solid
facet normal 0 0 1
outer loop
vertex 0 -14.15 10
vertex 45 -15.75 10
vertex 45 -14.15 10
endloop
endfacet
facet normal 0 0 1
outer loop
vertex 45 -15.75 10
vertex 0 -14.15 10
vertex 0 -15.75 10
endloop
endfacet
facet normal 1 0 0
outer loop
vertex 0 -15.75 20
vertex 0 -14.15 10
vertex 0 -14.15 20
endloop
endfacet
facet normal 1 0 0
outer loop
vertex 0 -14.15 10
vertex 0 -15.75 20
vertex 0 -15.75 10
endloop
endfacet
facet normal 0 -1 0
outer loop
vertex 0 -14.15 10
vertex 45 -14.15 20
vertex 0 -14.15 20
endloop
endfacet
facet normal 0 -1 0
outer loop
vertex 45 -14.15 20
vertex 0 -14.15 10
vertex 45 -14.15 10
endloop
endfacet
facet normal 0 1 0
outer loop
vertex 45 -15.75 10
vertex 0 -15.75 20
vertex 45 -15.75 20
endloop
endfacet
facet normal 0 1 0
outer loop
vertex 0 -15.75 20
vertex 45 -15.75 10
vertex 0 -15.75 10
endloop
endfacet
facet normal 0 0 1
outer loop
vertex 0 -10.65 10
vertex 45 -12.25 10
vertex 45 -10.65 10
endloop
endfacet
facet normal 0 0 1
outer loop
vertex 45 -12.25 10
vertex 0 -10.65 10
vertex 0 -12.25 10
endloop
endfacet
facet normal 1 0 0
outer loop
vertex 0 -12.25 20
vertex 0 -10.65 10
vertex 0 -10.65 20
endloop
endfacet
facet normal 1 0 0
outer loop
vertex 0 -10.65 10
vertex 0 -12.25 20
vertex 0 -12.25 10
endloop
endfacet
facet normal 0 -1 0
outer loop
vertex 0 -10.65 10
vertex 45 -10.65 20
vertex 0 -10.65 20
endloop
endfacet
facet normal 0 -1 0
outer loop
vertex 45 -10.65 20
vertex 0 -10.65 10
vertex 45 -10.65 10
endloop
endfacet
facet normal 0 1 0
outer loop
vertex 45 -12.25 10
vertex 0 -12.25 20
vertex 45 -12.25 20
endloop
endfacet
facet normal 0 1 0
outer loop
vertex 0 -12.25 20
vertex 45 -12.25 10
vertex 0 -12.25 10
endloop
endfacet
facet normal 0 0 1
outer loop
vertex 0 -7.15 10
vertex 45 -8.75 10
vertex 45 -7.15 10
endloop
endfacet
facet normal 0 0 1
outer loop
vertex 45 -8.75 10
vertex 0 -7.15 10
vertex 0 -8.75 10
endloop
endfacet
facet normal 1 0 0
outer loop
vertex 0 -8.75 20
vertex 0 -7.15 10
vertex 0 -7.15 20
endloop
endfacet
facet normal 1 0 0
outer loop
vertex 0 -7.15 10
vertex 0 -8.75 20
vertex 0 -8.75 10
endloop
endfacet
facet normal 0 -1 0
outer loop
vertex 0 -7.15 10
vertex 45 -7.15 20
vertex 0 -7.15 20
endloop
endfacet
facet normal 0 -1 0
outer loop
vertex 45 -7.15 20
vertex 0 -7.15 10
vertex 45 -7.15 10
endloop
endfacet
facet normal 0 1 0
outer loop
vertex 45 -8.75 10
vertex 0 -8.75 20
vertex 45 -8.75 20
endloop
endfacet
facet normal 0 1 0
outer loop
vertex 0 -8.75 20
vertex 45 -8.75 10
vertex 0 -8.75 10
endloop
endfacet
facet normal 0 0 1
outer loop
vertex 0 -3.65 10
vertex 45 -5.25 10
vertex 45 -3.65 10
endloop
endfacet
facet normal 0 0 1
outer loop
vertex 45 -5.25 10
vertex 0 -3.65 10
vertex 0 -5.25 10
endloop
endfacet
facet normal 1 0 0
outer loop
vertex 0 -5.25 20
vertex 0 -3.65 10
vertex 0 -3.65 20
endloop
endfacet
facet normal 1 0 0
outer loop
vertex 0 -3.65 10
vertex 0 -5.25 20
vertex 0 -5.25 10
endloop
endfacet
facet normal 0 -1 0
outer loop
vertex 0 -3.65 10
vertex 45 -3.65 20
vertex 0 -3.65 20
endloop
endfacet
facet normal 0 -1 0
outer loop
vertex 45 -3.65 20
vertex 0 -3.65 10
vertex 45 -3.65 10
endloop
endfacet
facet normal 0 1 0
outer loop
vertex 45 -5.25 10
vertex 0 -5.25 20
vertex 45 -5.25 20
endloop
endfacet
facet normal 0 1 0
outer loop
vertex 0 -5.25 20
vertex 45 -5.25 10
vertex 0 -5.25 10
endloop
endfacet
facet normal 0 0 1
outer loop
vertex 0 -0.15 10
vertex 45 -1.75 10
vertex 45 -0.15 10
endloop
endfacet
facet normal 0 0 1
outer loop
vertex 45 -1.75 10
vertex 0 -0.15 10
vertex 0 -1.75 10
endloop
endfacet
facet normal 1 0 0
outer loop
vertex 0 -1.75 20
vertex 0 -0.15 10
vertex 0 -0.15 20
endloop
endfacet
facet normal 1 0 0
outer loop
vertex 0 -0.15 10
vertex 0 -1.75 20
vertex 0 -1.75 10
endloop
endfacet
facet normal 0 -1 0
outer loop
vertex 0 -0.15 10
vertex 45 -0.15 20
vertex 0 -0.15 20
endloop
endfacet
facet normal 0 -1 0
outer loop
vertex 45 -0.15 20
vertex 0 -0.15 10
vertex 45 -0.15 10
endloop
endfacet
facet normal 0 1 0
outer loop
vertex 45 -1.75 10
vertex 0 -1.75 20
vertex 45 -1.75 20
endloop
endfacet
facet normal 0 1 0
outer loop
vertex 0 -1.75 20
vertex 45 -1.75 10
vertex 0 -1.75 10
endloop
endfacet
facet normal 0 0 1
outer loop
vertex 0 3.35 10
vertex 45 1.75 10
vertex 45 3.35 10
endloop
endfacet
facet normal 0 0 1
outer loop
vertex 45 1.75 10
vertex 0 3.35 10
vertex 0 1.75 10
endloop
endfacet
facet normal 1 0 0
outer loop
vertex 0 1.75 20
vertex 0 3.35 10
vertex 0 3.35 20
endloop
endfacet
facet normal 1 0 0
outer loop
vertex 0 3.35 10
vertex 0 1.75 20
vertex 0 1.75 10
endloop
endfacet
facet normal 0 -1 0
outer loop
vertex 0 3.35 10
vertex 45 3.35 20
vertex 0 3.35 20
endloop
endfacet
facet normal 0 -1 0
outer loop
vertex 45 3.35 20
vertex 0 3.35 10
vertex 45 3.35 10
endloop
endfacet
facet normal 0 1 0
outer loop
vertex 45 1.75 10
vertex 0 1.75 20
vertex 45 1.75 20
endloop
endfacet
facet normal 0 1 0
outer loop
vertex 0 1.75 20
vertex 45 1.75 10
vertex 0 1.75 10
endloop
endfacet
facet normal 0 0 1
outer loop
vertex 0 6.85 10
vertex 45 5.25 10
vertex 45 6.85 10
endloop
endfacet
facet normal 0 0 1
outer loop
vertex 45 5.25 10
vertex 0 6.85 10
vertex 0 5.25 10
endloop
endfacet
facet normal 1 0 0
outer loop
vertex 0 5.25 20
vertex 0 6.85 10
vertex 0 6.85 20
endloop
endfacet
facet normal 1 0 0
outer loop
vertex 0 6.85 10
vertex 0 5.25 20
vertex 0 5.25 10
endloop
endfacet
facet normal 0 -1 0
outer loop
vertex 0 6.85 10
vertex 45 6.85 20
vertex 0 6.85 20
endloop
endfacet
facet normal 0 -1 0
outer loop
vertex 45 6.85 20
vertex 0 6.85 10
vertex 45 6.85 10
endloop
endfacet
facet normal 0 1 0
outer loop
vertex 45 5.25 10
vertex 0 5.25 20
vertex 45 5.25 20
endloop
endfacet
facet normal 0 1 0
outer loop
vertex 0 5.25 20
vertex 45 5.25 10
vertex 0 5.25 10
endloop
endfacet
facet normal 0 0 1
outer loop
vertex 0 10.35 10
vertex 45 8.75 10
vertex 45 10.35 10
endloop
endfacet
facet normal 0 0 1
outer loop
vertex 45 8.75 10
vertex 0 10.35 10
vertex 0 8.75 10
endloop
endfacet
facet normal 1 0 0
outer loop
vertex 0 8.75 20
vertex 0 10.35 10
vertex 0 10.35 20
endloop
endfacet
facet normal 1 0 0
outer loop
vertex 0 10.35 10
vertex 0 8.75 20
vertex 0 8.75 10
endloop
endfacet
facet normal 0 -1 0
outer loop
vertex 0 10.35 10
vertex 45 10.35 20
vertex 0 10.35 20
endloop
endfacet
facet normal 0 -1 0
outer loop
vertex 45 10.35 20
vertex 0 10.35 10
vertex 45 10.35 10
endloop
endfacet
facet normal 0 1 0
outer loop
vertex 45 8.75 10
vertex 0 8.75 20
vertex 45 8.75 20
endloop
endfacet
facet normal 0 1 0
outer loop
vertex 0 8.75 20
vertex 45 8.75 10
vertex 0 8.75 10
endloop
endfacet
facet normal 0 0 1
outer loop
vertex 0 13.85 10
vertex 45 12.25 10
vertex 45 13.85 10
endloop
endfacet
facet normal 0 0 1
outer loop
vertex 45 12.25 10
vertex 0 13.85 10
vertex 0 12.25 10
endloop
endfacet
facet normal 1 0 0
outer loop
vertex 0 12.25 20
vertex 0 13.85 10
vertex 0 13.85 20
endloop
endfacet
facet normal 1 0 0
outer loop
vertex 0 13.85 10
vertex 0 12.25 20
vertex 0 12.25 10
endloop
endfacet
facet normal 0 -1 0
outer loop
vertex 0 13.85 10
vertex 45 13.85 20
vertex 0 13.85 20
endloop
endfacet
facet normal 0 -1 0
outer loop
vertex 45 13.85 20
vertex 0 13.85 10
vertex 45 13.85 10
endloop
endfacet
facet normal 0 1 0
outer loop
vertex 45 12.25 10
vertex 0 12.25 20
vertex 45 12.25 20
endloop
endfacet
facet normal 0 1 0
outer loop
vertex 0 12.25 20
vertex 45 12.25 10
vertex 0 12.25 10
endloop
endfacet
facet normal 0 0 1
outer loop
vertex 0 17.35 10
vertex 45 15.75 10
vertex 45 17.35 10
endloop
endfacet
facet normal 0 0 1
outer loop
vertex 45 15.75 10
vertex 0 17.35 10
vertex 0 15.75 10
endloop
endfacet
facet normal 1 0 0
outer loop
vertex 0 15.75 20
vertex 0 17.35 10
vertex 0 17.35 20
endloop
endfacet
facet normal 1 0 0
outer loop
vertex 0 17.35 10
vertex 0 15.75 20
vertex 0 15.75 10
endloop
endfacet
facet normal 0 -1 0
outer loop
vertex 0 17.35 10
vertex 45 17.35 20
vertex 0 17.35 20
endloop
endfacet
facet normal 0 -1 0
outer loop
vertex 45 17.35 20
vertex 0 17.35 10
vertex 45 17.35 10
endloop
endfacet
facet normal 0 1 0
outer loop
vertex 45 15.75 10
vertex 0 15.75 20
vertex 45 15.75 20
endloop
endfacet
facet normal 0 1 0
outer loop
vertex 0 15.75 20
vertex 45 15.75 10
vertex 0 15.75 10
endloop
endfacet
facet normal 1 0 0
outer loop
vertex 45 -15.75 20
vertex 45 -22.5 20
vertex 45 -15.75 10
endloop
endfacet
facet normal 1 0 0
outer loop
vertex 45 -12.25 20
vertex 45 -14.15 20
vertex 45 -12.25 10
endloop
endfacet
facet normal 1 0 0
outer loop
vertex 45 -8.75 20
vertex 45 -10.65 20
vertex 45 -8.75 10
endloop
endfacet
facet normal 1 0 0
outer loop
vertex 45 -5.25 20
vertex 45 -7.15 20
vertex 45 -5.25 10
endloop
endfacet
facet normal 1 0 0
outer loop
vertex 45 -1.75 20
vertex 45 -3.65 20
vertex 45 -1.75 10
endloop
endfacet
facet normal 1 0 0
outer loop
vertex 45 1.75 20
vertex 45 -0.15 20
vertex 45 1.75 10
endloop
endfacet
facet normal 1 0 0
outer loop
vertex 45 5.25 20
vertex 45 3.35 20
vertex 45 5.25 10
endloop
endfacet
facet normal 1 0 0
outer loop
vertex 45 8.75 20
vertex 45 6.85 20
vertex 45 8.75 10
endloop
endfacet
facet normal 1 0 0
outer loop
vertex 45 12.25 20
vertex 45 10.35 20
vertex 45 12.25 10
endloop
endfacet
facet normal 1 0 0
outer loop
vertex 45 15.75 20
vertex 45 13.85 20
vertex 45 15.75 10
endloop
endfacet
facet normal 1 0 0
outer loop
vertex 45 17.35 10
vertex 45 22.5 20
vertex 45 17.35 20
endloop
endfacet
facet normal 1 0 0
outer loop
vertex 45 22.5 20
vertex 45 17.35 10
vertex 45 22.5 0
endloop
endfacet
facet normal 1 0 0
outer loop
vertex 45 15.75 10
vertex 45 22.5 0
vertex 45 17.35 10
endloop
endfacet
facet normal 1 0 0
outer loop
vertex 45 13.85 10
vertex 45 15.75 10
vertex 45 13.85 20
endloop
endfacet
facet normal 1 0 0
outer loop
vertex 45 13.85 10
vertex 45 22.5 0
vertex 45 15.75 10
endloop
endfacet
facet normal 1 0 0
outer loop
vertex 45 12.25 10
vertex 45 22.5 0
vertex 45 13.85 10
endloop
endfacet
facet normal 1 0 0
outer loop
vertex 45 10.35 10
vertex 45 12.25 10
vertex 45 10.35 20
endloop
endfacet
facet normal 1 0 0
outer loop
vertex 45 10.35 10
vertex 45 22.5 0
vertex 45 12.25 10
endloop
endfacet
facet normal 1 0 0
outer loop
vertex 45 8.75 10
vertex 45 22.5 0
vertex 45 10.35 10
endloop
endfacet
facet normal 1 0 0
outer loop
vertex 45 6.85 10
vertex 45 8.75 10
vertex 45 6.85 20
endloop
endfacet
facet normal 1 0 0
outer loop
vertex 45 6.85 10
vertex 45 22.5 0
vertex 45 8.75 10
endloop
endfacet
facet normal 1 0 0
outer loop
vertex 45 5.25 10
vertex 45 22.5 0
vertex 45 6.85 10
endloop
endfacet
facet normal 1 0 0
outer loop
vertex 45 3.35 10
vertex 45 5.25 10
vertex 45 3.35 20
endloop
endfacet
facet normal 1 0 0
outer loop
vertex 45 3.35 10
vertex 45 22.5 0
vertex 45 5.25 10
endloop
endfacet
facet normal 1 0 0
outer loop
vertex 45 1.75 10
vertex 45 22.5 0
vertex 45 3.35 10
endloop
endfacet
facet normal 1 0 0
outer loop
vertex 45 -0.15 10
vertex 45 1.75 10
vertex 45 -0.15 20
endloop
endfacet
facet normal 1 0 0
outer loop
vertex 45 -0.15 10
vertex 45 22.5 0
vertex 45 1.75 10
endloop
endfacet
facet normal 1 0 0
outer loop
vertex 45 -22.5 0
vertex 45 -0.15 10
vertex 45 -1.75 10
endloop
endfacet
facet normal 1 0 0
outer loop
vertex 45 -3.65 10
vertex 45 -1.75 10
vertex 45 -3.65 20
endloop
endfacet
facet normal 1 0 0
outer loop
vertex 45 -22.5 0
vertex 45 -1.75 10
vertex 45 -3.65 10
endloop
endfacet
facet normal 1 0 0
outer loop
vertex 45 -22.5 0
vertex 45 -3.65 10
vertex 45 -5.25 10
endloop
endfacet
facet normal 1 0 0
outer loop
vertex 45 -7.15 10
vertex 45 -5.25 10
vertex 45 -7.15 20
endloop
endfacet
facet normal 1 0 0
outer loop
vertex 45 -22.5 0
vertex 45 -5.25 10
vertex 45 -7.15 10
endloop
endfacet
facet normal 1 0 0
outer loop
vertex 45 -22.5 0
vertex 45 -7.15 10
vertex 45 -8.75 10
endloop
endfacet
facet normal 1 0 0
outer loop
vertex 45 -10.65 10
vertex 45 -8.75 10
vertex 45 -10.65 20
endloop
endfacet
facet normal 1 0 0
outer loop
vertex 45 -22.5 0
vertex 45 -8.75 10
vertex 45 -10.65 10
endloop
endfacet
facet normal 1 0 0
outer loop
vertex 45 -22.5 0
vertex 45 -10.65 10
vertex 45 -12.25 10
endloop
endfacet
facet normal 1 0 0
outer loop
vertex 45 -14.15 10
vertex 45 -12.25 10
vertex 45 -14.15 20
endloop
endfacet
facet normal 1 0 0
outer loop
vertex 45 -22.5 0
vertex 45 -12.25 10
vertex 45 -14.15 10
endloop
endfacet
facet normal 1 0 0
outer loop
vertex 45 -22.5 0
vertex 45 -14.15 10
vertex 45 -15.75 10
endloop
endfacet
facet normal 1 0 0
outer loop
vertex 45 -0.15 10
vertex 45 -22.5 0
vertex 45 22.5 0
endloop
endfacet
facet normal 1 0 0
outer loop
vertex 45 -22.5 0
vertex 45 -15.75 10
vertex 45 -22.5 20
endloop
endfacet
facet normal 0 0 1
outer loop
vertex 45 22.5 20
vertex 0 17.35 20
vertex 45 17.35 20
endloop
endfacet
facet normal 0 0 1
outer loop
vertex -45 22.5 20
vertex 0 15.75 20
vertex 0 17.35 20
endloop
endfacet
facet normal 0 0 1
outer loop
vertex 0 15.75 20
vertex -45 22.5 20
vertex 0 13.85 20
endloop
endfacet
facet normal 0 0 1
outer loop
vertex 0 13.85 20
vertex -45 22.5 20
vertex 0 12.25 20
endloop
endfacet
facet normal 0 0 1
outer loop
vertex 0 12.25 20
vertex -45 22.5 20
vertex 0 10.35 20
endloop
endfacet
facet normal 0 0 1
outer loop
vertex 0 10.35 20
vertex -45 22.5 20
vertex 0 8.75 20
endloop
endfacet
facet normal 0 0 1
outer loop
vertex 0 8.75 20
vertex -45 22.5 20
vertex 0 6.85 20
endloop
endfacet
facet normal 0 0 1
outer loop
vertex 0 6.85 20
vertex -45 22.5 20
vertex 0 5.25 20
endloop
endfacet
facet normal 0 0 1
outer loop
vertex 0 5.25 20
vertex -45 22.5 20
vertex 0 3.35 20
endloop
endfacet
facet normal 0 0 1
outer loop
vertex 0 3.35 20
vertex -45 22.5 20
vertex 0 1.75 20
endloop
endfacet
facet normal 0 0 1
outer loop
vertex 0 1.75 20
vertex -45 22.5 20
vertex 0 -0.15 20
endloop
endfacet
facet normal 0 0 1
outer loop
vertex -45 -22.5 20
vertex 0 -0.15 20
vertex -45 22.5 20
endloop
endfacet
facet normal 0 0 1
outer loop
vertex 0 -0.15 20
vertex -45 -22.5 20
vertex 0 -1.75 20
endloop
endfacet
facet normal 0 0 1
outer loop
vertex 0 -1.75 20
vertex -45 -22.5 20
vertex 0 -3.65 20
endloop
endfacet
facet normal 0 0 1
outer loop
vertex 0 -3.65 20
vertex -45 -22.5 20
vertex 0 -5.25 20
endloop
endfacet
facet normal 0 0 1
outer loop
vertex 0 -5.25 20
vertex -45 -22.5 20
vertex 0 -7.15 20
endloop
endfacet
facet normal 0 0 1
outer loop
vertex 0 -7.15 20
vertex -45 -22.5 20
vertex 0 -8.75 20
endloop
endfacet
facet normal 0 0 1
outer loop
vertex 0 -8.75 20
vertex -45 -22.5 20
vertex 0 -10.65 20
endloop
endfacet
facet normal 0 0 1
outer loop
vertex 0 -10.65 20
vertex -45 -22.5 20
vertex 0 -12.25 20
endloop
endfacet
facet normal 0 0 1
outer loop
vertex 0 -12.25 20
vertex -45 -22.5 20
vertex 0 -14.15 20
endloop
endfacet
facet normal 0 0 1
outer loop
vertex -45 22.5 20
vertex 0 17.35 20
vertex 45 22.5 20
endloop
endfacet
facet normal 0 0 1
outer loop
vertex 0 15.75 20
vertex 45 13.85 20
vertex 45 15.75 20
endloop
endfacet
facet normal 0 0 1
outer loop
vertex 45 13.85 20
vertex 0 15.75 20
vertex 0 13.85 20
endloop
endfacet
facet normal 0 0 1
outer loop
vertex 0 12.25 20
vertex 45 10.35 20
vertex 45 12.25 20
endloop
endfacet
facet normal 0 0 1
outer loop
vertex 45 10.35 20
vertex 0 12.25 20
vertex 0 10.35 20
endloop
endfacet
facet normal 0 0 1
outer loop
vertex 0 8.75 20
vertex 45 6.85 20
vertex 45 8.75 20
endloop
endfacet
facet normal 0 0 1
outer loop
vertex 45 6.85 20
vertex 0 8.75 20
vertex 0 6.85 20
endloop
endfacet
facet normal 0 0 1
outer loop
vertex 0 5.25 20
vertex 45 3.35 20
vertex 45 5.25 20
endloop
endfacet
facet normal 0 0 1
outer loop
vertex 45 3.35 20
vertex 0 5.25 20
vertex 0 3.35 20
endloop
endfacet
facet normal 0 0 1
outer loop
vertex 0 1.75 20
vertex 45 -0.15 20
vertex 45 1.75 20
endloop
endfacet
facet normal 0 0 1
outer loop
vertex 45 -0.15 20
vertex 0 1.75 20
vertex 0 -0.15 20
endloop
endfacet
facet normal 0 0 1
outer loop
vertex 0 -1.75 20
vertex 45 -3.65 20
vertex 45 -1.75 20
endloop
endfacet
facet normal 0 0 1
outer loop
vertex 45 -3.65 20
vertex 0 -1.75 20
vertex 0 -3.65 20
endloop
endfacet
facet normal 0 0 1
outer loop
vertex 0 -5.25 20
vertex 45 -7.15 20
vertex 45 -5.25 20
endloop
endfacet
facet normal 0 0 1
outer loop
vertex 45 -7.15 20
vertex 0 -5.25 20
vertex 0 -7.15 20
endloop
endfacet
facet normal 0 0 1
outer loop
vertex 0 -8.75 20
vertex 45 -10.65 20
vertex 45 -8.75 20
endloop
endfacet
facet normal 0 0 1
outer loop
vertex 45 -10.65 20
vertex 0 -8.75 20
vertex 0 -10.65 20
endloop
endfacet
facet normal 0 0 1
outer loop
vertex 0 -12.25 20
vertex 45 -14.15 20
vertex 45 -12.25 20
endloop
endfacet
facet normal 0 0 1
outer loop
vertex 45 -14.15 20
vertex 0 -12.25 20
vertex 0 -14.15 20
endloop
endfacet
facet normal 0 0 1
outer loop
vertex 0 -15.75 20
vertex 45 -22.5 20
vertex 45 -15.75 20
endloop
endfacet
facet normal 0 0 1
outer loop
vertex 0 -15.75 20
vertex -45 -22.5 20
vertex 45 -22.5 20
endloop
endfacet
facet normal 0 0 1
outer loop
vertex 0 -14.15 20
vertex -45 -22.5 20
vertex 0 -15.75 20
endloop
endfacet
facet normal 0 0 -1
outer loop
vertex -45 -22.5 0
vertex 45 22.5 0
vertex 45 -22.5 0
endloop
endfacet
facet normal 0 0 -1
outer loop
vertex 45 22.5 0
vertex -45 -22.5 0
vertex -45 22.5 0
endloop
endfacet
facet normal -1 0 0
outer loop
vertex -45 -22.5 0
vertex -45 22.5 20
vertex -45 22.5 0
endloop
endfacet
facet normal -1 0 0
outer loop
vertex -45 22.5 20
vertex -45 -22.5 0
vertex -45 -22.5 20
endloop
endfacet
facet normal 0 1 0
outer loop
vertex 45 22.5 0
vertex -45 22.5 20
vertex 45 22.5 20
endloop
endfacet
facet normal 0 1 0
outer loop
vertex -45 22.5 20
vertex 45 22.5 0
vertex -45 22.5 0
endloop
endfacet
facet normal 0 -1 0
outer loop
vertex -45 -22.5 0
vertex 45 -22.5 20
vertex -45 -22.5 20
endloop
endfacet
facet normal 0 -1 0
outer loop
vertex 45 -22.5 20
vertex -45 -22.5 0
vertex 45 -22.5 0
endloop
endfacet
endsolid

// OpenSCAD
// Slide drying rack - holds 10 microscope slides standing upright on their long edge
// Print orientation: base block on the bed, slots open upward (+Z)

// ---------- Block ----------
block_len   = 90;    // block length along X (mm)
block_wid   = 45;    // block width along Y (mm)
block_ht    = 20;    // block height along Z (mm)

// ---------- Slots ----------
slot_count  = 10;    // number of slide slots
slot_len    = 77;    // slot length along X (mm)
slot_wid    = 1.6;   // slot width along Y (mm)
slot_depth  = 10;    // slot depth from top face (mm)
slot_pitch  = 3.5;   // centre-to-centre spacing in Y (mm)

// ---------- Misc ----------
eps         = 0.5;   // overshoot for clean boolean cuts (mm)
$fn         = 64;    // curve resolution

// Derived
first_y = -(slot_count - 1) * slot_pitch / 2;  // Y of first slot, groups centred in Y

difference() {
    // Solid base block, centred in X and Y, resting on z = 0
    translate([-block_len / 2, -block_wid / 2, 0])
        cube([block_len, block_wid, block_ht]);

    // Parallel slots, open at the top
    for (i = [0 : slot_count - 1]) {
        translate([0, first_y + i * slot_pitch, block_ht - slot_depth])
            cube([slot_len, slot_wid, slot_depth + eps]);
    }
}
